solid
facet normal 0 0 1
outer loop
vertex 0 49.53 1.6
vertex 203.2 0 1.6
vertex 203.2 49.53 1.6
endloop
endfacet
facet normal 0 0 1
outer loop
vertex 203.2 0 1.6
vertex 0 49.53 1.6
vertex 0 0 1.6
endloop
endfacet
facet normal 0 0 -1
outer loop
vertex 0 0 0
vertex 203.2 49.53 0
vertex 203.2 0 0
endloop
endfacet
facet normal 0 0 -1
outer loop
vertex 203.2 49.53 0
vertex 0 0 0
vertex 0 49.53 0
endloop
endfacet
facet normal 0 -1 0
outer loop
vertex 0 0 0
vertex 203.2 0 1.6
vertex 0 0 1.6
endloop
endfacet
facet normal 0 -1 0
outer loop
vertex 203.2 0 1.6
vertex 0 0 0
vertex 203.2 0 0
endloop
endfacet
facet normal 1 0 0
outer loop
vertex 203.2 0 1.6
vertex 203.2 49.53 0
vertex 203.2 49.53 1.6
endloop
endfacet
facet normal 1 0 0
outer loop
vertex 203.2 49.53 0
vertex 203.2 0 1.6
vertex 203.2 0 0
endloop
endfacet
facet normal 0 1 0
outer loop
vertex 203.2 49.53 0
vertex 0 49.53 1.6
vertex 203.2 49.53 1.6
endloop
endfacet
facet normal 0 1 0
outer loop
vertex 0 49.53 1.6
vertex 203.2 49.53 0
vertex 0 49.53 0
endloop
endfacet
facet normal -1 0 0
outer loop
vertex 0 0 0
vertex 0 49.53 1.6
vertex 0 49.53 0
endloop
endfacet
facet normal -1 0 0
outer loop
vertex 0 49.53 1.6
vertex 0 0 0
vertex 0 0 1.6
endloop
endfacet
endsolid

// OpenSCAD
$fn=64;

board_length = 203.2;
board_width  = 49.53;
board_thick  = 1.6;

color([0.05, 0.45, 0.18])
cube([board_length, board_width, board_thick], center=false);
